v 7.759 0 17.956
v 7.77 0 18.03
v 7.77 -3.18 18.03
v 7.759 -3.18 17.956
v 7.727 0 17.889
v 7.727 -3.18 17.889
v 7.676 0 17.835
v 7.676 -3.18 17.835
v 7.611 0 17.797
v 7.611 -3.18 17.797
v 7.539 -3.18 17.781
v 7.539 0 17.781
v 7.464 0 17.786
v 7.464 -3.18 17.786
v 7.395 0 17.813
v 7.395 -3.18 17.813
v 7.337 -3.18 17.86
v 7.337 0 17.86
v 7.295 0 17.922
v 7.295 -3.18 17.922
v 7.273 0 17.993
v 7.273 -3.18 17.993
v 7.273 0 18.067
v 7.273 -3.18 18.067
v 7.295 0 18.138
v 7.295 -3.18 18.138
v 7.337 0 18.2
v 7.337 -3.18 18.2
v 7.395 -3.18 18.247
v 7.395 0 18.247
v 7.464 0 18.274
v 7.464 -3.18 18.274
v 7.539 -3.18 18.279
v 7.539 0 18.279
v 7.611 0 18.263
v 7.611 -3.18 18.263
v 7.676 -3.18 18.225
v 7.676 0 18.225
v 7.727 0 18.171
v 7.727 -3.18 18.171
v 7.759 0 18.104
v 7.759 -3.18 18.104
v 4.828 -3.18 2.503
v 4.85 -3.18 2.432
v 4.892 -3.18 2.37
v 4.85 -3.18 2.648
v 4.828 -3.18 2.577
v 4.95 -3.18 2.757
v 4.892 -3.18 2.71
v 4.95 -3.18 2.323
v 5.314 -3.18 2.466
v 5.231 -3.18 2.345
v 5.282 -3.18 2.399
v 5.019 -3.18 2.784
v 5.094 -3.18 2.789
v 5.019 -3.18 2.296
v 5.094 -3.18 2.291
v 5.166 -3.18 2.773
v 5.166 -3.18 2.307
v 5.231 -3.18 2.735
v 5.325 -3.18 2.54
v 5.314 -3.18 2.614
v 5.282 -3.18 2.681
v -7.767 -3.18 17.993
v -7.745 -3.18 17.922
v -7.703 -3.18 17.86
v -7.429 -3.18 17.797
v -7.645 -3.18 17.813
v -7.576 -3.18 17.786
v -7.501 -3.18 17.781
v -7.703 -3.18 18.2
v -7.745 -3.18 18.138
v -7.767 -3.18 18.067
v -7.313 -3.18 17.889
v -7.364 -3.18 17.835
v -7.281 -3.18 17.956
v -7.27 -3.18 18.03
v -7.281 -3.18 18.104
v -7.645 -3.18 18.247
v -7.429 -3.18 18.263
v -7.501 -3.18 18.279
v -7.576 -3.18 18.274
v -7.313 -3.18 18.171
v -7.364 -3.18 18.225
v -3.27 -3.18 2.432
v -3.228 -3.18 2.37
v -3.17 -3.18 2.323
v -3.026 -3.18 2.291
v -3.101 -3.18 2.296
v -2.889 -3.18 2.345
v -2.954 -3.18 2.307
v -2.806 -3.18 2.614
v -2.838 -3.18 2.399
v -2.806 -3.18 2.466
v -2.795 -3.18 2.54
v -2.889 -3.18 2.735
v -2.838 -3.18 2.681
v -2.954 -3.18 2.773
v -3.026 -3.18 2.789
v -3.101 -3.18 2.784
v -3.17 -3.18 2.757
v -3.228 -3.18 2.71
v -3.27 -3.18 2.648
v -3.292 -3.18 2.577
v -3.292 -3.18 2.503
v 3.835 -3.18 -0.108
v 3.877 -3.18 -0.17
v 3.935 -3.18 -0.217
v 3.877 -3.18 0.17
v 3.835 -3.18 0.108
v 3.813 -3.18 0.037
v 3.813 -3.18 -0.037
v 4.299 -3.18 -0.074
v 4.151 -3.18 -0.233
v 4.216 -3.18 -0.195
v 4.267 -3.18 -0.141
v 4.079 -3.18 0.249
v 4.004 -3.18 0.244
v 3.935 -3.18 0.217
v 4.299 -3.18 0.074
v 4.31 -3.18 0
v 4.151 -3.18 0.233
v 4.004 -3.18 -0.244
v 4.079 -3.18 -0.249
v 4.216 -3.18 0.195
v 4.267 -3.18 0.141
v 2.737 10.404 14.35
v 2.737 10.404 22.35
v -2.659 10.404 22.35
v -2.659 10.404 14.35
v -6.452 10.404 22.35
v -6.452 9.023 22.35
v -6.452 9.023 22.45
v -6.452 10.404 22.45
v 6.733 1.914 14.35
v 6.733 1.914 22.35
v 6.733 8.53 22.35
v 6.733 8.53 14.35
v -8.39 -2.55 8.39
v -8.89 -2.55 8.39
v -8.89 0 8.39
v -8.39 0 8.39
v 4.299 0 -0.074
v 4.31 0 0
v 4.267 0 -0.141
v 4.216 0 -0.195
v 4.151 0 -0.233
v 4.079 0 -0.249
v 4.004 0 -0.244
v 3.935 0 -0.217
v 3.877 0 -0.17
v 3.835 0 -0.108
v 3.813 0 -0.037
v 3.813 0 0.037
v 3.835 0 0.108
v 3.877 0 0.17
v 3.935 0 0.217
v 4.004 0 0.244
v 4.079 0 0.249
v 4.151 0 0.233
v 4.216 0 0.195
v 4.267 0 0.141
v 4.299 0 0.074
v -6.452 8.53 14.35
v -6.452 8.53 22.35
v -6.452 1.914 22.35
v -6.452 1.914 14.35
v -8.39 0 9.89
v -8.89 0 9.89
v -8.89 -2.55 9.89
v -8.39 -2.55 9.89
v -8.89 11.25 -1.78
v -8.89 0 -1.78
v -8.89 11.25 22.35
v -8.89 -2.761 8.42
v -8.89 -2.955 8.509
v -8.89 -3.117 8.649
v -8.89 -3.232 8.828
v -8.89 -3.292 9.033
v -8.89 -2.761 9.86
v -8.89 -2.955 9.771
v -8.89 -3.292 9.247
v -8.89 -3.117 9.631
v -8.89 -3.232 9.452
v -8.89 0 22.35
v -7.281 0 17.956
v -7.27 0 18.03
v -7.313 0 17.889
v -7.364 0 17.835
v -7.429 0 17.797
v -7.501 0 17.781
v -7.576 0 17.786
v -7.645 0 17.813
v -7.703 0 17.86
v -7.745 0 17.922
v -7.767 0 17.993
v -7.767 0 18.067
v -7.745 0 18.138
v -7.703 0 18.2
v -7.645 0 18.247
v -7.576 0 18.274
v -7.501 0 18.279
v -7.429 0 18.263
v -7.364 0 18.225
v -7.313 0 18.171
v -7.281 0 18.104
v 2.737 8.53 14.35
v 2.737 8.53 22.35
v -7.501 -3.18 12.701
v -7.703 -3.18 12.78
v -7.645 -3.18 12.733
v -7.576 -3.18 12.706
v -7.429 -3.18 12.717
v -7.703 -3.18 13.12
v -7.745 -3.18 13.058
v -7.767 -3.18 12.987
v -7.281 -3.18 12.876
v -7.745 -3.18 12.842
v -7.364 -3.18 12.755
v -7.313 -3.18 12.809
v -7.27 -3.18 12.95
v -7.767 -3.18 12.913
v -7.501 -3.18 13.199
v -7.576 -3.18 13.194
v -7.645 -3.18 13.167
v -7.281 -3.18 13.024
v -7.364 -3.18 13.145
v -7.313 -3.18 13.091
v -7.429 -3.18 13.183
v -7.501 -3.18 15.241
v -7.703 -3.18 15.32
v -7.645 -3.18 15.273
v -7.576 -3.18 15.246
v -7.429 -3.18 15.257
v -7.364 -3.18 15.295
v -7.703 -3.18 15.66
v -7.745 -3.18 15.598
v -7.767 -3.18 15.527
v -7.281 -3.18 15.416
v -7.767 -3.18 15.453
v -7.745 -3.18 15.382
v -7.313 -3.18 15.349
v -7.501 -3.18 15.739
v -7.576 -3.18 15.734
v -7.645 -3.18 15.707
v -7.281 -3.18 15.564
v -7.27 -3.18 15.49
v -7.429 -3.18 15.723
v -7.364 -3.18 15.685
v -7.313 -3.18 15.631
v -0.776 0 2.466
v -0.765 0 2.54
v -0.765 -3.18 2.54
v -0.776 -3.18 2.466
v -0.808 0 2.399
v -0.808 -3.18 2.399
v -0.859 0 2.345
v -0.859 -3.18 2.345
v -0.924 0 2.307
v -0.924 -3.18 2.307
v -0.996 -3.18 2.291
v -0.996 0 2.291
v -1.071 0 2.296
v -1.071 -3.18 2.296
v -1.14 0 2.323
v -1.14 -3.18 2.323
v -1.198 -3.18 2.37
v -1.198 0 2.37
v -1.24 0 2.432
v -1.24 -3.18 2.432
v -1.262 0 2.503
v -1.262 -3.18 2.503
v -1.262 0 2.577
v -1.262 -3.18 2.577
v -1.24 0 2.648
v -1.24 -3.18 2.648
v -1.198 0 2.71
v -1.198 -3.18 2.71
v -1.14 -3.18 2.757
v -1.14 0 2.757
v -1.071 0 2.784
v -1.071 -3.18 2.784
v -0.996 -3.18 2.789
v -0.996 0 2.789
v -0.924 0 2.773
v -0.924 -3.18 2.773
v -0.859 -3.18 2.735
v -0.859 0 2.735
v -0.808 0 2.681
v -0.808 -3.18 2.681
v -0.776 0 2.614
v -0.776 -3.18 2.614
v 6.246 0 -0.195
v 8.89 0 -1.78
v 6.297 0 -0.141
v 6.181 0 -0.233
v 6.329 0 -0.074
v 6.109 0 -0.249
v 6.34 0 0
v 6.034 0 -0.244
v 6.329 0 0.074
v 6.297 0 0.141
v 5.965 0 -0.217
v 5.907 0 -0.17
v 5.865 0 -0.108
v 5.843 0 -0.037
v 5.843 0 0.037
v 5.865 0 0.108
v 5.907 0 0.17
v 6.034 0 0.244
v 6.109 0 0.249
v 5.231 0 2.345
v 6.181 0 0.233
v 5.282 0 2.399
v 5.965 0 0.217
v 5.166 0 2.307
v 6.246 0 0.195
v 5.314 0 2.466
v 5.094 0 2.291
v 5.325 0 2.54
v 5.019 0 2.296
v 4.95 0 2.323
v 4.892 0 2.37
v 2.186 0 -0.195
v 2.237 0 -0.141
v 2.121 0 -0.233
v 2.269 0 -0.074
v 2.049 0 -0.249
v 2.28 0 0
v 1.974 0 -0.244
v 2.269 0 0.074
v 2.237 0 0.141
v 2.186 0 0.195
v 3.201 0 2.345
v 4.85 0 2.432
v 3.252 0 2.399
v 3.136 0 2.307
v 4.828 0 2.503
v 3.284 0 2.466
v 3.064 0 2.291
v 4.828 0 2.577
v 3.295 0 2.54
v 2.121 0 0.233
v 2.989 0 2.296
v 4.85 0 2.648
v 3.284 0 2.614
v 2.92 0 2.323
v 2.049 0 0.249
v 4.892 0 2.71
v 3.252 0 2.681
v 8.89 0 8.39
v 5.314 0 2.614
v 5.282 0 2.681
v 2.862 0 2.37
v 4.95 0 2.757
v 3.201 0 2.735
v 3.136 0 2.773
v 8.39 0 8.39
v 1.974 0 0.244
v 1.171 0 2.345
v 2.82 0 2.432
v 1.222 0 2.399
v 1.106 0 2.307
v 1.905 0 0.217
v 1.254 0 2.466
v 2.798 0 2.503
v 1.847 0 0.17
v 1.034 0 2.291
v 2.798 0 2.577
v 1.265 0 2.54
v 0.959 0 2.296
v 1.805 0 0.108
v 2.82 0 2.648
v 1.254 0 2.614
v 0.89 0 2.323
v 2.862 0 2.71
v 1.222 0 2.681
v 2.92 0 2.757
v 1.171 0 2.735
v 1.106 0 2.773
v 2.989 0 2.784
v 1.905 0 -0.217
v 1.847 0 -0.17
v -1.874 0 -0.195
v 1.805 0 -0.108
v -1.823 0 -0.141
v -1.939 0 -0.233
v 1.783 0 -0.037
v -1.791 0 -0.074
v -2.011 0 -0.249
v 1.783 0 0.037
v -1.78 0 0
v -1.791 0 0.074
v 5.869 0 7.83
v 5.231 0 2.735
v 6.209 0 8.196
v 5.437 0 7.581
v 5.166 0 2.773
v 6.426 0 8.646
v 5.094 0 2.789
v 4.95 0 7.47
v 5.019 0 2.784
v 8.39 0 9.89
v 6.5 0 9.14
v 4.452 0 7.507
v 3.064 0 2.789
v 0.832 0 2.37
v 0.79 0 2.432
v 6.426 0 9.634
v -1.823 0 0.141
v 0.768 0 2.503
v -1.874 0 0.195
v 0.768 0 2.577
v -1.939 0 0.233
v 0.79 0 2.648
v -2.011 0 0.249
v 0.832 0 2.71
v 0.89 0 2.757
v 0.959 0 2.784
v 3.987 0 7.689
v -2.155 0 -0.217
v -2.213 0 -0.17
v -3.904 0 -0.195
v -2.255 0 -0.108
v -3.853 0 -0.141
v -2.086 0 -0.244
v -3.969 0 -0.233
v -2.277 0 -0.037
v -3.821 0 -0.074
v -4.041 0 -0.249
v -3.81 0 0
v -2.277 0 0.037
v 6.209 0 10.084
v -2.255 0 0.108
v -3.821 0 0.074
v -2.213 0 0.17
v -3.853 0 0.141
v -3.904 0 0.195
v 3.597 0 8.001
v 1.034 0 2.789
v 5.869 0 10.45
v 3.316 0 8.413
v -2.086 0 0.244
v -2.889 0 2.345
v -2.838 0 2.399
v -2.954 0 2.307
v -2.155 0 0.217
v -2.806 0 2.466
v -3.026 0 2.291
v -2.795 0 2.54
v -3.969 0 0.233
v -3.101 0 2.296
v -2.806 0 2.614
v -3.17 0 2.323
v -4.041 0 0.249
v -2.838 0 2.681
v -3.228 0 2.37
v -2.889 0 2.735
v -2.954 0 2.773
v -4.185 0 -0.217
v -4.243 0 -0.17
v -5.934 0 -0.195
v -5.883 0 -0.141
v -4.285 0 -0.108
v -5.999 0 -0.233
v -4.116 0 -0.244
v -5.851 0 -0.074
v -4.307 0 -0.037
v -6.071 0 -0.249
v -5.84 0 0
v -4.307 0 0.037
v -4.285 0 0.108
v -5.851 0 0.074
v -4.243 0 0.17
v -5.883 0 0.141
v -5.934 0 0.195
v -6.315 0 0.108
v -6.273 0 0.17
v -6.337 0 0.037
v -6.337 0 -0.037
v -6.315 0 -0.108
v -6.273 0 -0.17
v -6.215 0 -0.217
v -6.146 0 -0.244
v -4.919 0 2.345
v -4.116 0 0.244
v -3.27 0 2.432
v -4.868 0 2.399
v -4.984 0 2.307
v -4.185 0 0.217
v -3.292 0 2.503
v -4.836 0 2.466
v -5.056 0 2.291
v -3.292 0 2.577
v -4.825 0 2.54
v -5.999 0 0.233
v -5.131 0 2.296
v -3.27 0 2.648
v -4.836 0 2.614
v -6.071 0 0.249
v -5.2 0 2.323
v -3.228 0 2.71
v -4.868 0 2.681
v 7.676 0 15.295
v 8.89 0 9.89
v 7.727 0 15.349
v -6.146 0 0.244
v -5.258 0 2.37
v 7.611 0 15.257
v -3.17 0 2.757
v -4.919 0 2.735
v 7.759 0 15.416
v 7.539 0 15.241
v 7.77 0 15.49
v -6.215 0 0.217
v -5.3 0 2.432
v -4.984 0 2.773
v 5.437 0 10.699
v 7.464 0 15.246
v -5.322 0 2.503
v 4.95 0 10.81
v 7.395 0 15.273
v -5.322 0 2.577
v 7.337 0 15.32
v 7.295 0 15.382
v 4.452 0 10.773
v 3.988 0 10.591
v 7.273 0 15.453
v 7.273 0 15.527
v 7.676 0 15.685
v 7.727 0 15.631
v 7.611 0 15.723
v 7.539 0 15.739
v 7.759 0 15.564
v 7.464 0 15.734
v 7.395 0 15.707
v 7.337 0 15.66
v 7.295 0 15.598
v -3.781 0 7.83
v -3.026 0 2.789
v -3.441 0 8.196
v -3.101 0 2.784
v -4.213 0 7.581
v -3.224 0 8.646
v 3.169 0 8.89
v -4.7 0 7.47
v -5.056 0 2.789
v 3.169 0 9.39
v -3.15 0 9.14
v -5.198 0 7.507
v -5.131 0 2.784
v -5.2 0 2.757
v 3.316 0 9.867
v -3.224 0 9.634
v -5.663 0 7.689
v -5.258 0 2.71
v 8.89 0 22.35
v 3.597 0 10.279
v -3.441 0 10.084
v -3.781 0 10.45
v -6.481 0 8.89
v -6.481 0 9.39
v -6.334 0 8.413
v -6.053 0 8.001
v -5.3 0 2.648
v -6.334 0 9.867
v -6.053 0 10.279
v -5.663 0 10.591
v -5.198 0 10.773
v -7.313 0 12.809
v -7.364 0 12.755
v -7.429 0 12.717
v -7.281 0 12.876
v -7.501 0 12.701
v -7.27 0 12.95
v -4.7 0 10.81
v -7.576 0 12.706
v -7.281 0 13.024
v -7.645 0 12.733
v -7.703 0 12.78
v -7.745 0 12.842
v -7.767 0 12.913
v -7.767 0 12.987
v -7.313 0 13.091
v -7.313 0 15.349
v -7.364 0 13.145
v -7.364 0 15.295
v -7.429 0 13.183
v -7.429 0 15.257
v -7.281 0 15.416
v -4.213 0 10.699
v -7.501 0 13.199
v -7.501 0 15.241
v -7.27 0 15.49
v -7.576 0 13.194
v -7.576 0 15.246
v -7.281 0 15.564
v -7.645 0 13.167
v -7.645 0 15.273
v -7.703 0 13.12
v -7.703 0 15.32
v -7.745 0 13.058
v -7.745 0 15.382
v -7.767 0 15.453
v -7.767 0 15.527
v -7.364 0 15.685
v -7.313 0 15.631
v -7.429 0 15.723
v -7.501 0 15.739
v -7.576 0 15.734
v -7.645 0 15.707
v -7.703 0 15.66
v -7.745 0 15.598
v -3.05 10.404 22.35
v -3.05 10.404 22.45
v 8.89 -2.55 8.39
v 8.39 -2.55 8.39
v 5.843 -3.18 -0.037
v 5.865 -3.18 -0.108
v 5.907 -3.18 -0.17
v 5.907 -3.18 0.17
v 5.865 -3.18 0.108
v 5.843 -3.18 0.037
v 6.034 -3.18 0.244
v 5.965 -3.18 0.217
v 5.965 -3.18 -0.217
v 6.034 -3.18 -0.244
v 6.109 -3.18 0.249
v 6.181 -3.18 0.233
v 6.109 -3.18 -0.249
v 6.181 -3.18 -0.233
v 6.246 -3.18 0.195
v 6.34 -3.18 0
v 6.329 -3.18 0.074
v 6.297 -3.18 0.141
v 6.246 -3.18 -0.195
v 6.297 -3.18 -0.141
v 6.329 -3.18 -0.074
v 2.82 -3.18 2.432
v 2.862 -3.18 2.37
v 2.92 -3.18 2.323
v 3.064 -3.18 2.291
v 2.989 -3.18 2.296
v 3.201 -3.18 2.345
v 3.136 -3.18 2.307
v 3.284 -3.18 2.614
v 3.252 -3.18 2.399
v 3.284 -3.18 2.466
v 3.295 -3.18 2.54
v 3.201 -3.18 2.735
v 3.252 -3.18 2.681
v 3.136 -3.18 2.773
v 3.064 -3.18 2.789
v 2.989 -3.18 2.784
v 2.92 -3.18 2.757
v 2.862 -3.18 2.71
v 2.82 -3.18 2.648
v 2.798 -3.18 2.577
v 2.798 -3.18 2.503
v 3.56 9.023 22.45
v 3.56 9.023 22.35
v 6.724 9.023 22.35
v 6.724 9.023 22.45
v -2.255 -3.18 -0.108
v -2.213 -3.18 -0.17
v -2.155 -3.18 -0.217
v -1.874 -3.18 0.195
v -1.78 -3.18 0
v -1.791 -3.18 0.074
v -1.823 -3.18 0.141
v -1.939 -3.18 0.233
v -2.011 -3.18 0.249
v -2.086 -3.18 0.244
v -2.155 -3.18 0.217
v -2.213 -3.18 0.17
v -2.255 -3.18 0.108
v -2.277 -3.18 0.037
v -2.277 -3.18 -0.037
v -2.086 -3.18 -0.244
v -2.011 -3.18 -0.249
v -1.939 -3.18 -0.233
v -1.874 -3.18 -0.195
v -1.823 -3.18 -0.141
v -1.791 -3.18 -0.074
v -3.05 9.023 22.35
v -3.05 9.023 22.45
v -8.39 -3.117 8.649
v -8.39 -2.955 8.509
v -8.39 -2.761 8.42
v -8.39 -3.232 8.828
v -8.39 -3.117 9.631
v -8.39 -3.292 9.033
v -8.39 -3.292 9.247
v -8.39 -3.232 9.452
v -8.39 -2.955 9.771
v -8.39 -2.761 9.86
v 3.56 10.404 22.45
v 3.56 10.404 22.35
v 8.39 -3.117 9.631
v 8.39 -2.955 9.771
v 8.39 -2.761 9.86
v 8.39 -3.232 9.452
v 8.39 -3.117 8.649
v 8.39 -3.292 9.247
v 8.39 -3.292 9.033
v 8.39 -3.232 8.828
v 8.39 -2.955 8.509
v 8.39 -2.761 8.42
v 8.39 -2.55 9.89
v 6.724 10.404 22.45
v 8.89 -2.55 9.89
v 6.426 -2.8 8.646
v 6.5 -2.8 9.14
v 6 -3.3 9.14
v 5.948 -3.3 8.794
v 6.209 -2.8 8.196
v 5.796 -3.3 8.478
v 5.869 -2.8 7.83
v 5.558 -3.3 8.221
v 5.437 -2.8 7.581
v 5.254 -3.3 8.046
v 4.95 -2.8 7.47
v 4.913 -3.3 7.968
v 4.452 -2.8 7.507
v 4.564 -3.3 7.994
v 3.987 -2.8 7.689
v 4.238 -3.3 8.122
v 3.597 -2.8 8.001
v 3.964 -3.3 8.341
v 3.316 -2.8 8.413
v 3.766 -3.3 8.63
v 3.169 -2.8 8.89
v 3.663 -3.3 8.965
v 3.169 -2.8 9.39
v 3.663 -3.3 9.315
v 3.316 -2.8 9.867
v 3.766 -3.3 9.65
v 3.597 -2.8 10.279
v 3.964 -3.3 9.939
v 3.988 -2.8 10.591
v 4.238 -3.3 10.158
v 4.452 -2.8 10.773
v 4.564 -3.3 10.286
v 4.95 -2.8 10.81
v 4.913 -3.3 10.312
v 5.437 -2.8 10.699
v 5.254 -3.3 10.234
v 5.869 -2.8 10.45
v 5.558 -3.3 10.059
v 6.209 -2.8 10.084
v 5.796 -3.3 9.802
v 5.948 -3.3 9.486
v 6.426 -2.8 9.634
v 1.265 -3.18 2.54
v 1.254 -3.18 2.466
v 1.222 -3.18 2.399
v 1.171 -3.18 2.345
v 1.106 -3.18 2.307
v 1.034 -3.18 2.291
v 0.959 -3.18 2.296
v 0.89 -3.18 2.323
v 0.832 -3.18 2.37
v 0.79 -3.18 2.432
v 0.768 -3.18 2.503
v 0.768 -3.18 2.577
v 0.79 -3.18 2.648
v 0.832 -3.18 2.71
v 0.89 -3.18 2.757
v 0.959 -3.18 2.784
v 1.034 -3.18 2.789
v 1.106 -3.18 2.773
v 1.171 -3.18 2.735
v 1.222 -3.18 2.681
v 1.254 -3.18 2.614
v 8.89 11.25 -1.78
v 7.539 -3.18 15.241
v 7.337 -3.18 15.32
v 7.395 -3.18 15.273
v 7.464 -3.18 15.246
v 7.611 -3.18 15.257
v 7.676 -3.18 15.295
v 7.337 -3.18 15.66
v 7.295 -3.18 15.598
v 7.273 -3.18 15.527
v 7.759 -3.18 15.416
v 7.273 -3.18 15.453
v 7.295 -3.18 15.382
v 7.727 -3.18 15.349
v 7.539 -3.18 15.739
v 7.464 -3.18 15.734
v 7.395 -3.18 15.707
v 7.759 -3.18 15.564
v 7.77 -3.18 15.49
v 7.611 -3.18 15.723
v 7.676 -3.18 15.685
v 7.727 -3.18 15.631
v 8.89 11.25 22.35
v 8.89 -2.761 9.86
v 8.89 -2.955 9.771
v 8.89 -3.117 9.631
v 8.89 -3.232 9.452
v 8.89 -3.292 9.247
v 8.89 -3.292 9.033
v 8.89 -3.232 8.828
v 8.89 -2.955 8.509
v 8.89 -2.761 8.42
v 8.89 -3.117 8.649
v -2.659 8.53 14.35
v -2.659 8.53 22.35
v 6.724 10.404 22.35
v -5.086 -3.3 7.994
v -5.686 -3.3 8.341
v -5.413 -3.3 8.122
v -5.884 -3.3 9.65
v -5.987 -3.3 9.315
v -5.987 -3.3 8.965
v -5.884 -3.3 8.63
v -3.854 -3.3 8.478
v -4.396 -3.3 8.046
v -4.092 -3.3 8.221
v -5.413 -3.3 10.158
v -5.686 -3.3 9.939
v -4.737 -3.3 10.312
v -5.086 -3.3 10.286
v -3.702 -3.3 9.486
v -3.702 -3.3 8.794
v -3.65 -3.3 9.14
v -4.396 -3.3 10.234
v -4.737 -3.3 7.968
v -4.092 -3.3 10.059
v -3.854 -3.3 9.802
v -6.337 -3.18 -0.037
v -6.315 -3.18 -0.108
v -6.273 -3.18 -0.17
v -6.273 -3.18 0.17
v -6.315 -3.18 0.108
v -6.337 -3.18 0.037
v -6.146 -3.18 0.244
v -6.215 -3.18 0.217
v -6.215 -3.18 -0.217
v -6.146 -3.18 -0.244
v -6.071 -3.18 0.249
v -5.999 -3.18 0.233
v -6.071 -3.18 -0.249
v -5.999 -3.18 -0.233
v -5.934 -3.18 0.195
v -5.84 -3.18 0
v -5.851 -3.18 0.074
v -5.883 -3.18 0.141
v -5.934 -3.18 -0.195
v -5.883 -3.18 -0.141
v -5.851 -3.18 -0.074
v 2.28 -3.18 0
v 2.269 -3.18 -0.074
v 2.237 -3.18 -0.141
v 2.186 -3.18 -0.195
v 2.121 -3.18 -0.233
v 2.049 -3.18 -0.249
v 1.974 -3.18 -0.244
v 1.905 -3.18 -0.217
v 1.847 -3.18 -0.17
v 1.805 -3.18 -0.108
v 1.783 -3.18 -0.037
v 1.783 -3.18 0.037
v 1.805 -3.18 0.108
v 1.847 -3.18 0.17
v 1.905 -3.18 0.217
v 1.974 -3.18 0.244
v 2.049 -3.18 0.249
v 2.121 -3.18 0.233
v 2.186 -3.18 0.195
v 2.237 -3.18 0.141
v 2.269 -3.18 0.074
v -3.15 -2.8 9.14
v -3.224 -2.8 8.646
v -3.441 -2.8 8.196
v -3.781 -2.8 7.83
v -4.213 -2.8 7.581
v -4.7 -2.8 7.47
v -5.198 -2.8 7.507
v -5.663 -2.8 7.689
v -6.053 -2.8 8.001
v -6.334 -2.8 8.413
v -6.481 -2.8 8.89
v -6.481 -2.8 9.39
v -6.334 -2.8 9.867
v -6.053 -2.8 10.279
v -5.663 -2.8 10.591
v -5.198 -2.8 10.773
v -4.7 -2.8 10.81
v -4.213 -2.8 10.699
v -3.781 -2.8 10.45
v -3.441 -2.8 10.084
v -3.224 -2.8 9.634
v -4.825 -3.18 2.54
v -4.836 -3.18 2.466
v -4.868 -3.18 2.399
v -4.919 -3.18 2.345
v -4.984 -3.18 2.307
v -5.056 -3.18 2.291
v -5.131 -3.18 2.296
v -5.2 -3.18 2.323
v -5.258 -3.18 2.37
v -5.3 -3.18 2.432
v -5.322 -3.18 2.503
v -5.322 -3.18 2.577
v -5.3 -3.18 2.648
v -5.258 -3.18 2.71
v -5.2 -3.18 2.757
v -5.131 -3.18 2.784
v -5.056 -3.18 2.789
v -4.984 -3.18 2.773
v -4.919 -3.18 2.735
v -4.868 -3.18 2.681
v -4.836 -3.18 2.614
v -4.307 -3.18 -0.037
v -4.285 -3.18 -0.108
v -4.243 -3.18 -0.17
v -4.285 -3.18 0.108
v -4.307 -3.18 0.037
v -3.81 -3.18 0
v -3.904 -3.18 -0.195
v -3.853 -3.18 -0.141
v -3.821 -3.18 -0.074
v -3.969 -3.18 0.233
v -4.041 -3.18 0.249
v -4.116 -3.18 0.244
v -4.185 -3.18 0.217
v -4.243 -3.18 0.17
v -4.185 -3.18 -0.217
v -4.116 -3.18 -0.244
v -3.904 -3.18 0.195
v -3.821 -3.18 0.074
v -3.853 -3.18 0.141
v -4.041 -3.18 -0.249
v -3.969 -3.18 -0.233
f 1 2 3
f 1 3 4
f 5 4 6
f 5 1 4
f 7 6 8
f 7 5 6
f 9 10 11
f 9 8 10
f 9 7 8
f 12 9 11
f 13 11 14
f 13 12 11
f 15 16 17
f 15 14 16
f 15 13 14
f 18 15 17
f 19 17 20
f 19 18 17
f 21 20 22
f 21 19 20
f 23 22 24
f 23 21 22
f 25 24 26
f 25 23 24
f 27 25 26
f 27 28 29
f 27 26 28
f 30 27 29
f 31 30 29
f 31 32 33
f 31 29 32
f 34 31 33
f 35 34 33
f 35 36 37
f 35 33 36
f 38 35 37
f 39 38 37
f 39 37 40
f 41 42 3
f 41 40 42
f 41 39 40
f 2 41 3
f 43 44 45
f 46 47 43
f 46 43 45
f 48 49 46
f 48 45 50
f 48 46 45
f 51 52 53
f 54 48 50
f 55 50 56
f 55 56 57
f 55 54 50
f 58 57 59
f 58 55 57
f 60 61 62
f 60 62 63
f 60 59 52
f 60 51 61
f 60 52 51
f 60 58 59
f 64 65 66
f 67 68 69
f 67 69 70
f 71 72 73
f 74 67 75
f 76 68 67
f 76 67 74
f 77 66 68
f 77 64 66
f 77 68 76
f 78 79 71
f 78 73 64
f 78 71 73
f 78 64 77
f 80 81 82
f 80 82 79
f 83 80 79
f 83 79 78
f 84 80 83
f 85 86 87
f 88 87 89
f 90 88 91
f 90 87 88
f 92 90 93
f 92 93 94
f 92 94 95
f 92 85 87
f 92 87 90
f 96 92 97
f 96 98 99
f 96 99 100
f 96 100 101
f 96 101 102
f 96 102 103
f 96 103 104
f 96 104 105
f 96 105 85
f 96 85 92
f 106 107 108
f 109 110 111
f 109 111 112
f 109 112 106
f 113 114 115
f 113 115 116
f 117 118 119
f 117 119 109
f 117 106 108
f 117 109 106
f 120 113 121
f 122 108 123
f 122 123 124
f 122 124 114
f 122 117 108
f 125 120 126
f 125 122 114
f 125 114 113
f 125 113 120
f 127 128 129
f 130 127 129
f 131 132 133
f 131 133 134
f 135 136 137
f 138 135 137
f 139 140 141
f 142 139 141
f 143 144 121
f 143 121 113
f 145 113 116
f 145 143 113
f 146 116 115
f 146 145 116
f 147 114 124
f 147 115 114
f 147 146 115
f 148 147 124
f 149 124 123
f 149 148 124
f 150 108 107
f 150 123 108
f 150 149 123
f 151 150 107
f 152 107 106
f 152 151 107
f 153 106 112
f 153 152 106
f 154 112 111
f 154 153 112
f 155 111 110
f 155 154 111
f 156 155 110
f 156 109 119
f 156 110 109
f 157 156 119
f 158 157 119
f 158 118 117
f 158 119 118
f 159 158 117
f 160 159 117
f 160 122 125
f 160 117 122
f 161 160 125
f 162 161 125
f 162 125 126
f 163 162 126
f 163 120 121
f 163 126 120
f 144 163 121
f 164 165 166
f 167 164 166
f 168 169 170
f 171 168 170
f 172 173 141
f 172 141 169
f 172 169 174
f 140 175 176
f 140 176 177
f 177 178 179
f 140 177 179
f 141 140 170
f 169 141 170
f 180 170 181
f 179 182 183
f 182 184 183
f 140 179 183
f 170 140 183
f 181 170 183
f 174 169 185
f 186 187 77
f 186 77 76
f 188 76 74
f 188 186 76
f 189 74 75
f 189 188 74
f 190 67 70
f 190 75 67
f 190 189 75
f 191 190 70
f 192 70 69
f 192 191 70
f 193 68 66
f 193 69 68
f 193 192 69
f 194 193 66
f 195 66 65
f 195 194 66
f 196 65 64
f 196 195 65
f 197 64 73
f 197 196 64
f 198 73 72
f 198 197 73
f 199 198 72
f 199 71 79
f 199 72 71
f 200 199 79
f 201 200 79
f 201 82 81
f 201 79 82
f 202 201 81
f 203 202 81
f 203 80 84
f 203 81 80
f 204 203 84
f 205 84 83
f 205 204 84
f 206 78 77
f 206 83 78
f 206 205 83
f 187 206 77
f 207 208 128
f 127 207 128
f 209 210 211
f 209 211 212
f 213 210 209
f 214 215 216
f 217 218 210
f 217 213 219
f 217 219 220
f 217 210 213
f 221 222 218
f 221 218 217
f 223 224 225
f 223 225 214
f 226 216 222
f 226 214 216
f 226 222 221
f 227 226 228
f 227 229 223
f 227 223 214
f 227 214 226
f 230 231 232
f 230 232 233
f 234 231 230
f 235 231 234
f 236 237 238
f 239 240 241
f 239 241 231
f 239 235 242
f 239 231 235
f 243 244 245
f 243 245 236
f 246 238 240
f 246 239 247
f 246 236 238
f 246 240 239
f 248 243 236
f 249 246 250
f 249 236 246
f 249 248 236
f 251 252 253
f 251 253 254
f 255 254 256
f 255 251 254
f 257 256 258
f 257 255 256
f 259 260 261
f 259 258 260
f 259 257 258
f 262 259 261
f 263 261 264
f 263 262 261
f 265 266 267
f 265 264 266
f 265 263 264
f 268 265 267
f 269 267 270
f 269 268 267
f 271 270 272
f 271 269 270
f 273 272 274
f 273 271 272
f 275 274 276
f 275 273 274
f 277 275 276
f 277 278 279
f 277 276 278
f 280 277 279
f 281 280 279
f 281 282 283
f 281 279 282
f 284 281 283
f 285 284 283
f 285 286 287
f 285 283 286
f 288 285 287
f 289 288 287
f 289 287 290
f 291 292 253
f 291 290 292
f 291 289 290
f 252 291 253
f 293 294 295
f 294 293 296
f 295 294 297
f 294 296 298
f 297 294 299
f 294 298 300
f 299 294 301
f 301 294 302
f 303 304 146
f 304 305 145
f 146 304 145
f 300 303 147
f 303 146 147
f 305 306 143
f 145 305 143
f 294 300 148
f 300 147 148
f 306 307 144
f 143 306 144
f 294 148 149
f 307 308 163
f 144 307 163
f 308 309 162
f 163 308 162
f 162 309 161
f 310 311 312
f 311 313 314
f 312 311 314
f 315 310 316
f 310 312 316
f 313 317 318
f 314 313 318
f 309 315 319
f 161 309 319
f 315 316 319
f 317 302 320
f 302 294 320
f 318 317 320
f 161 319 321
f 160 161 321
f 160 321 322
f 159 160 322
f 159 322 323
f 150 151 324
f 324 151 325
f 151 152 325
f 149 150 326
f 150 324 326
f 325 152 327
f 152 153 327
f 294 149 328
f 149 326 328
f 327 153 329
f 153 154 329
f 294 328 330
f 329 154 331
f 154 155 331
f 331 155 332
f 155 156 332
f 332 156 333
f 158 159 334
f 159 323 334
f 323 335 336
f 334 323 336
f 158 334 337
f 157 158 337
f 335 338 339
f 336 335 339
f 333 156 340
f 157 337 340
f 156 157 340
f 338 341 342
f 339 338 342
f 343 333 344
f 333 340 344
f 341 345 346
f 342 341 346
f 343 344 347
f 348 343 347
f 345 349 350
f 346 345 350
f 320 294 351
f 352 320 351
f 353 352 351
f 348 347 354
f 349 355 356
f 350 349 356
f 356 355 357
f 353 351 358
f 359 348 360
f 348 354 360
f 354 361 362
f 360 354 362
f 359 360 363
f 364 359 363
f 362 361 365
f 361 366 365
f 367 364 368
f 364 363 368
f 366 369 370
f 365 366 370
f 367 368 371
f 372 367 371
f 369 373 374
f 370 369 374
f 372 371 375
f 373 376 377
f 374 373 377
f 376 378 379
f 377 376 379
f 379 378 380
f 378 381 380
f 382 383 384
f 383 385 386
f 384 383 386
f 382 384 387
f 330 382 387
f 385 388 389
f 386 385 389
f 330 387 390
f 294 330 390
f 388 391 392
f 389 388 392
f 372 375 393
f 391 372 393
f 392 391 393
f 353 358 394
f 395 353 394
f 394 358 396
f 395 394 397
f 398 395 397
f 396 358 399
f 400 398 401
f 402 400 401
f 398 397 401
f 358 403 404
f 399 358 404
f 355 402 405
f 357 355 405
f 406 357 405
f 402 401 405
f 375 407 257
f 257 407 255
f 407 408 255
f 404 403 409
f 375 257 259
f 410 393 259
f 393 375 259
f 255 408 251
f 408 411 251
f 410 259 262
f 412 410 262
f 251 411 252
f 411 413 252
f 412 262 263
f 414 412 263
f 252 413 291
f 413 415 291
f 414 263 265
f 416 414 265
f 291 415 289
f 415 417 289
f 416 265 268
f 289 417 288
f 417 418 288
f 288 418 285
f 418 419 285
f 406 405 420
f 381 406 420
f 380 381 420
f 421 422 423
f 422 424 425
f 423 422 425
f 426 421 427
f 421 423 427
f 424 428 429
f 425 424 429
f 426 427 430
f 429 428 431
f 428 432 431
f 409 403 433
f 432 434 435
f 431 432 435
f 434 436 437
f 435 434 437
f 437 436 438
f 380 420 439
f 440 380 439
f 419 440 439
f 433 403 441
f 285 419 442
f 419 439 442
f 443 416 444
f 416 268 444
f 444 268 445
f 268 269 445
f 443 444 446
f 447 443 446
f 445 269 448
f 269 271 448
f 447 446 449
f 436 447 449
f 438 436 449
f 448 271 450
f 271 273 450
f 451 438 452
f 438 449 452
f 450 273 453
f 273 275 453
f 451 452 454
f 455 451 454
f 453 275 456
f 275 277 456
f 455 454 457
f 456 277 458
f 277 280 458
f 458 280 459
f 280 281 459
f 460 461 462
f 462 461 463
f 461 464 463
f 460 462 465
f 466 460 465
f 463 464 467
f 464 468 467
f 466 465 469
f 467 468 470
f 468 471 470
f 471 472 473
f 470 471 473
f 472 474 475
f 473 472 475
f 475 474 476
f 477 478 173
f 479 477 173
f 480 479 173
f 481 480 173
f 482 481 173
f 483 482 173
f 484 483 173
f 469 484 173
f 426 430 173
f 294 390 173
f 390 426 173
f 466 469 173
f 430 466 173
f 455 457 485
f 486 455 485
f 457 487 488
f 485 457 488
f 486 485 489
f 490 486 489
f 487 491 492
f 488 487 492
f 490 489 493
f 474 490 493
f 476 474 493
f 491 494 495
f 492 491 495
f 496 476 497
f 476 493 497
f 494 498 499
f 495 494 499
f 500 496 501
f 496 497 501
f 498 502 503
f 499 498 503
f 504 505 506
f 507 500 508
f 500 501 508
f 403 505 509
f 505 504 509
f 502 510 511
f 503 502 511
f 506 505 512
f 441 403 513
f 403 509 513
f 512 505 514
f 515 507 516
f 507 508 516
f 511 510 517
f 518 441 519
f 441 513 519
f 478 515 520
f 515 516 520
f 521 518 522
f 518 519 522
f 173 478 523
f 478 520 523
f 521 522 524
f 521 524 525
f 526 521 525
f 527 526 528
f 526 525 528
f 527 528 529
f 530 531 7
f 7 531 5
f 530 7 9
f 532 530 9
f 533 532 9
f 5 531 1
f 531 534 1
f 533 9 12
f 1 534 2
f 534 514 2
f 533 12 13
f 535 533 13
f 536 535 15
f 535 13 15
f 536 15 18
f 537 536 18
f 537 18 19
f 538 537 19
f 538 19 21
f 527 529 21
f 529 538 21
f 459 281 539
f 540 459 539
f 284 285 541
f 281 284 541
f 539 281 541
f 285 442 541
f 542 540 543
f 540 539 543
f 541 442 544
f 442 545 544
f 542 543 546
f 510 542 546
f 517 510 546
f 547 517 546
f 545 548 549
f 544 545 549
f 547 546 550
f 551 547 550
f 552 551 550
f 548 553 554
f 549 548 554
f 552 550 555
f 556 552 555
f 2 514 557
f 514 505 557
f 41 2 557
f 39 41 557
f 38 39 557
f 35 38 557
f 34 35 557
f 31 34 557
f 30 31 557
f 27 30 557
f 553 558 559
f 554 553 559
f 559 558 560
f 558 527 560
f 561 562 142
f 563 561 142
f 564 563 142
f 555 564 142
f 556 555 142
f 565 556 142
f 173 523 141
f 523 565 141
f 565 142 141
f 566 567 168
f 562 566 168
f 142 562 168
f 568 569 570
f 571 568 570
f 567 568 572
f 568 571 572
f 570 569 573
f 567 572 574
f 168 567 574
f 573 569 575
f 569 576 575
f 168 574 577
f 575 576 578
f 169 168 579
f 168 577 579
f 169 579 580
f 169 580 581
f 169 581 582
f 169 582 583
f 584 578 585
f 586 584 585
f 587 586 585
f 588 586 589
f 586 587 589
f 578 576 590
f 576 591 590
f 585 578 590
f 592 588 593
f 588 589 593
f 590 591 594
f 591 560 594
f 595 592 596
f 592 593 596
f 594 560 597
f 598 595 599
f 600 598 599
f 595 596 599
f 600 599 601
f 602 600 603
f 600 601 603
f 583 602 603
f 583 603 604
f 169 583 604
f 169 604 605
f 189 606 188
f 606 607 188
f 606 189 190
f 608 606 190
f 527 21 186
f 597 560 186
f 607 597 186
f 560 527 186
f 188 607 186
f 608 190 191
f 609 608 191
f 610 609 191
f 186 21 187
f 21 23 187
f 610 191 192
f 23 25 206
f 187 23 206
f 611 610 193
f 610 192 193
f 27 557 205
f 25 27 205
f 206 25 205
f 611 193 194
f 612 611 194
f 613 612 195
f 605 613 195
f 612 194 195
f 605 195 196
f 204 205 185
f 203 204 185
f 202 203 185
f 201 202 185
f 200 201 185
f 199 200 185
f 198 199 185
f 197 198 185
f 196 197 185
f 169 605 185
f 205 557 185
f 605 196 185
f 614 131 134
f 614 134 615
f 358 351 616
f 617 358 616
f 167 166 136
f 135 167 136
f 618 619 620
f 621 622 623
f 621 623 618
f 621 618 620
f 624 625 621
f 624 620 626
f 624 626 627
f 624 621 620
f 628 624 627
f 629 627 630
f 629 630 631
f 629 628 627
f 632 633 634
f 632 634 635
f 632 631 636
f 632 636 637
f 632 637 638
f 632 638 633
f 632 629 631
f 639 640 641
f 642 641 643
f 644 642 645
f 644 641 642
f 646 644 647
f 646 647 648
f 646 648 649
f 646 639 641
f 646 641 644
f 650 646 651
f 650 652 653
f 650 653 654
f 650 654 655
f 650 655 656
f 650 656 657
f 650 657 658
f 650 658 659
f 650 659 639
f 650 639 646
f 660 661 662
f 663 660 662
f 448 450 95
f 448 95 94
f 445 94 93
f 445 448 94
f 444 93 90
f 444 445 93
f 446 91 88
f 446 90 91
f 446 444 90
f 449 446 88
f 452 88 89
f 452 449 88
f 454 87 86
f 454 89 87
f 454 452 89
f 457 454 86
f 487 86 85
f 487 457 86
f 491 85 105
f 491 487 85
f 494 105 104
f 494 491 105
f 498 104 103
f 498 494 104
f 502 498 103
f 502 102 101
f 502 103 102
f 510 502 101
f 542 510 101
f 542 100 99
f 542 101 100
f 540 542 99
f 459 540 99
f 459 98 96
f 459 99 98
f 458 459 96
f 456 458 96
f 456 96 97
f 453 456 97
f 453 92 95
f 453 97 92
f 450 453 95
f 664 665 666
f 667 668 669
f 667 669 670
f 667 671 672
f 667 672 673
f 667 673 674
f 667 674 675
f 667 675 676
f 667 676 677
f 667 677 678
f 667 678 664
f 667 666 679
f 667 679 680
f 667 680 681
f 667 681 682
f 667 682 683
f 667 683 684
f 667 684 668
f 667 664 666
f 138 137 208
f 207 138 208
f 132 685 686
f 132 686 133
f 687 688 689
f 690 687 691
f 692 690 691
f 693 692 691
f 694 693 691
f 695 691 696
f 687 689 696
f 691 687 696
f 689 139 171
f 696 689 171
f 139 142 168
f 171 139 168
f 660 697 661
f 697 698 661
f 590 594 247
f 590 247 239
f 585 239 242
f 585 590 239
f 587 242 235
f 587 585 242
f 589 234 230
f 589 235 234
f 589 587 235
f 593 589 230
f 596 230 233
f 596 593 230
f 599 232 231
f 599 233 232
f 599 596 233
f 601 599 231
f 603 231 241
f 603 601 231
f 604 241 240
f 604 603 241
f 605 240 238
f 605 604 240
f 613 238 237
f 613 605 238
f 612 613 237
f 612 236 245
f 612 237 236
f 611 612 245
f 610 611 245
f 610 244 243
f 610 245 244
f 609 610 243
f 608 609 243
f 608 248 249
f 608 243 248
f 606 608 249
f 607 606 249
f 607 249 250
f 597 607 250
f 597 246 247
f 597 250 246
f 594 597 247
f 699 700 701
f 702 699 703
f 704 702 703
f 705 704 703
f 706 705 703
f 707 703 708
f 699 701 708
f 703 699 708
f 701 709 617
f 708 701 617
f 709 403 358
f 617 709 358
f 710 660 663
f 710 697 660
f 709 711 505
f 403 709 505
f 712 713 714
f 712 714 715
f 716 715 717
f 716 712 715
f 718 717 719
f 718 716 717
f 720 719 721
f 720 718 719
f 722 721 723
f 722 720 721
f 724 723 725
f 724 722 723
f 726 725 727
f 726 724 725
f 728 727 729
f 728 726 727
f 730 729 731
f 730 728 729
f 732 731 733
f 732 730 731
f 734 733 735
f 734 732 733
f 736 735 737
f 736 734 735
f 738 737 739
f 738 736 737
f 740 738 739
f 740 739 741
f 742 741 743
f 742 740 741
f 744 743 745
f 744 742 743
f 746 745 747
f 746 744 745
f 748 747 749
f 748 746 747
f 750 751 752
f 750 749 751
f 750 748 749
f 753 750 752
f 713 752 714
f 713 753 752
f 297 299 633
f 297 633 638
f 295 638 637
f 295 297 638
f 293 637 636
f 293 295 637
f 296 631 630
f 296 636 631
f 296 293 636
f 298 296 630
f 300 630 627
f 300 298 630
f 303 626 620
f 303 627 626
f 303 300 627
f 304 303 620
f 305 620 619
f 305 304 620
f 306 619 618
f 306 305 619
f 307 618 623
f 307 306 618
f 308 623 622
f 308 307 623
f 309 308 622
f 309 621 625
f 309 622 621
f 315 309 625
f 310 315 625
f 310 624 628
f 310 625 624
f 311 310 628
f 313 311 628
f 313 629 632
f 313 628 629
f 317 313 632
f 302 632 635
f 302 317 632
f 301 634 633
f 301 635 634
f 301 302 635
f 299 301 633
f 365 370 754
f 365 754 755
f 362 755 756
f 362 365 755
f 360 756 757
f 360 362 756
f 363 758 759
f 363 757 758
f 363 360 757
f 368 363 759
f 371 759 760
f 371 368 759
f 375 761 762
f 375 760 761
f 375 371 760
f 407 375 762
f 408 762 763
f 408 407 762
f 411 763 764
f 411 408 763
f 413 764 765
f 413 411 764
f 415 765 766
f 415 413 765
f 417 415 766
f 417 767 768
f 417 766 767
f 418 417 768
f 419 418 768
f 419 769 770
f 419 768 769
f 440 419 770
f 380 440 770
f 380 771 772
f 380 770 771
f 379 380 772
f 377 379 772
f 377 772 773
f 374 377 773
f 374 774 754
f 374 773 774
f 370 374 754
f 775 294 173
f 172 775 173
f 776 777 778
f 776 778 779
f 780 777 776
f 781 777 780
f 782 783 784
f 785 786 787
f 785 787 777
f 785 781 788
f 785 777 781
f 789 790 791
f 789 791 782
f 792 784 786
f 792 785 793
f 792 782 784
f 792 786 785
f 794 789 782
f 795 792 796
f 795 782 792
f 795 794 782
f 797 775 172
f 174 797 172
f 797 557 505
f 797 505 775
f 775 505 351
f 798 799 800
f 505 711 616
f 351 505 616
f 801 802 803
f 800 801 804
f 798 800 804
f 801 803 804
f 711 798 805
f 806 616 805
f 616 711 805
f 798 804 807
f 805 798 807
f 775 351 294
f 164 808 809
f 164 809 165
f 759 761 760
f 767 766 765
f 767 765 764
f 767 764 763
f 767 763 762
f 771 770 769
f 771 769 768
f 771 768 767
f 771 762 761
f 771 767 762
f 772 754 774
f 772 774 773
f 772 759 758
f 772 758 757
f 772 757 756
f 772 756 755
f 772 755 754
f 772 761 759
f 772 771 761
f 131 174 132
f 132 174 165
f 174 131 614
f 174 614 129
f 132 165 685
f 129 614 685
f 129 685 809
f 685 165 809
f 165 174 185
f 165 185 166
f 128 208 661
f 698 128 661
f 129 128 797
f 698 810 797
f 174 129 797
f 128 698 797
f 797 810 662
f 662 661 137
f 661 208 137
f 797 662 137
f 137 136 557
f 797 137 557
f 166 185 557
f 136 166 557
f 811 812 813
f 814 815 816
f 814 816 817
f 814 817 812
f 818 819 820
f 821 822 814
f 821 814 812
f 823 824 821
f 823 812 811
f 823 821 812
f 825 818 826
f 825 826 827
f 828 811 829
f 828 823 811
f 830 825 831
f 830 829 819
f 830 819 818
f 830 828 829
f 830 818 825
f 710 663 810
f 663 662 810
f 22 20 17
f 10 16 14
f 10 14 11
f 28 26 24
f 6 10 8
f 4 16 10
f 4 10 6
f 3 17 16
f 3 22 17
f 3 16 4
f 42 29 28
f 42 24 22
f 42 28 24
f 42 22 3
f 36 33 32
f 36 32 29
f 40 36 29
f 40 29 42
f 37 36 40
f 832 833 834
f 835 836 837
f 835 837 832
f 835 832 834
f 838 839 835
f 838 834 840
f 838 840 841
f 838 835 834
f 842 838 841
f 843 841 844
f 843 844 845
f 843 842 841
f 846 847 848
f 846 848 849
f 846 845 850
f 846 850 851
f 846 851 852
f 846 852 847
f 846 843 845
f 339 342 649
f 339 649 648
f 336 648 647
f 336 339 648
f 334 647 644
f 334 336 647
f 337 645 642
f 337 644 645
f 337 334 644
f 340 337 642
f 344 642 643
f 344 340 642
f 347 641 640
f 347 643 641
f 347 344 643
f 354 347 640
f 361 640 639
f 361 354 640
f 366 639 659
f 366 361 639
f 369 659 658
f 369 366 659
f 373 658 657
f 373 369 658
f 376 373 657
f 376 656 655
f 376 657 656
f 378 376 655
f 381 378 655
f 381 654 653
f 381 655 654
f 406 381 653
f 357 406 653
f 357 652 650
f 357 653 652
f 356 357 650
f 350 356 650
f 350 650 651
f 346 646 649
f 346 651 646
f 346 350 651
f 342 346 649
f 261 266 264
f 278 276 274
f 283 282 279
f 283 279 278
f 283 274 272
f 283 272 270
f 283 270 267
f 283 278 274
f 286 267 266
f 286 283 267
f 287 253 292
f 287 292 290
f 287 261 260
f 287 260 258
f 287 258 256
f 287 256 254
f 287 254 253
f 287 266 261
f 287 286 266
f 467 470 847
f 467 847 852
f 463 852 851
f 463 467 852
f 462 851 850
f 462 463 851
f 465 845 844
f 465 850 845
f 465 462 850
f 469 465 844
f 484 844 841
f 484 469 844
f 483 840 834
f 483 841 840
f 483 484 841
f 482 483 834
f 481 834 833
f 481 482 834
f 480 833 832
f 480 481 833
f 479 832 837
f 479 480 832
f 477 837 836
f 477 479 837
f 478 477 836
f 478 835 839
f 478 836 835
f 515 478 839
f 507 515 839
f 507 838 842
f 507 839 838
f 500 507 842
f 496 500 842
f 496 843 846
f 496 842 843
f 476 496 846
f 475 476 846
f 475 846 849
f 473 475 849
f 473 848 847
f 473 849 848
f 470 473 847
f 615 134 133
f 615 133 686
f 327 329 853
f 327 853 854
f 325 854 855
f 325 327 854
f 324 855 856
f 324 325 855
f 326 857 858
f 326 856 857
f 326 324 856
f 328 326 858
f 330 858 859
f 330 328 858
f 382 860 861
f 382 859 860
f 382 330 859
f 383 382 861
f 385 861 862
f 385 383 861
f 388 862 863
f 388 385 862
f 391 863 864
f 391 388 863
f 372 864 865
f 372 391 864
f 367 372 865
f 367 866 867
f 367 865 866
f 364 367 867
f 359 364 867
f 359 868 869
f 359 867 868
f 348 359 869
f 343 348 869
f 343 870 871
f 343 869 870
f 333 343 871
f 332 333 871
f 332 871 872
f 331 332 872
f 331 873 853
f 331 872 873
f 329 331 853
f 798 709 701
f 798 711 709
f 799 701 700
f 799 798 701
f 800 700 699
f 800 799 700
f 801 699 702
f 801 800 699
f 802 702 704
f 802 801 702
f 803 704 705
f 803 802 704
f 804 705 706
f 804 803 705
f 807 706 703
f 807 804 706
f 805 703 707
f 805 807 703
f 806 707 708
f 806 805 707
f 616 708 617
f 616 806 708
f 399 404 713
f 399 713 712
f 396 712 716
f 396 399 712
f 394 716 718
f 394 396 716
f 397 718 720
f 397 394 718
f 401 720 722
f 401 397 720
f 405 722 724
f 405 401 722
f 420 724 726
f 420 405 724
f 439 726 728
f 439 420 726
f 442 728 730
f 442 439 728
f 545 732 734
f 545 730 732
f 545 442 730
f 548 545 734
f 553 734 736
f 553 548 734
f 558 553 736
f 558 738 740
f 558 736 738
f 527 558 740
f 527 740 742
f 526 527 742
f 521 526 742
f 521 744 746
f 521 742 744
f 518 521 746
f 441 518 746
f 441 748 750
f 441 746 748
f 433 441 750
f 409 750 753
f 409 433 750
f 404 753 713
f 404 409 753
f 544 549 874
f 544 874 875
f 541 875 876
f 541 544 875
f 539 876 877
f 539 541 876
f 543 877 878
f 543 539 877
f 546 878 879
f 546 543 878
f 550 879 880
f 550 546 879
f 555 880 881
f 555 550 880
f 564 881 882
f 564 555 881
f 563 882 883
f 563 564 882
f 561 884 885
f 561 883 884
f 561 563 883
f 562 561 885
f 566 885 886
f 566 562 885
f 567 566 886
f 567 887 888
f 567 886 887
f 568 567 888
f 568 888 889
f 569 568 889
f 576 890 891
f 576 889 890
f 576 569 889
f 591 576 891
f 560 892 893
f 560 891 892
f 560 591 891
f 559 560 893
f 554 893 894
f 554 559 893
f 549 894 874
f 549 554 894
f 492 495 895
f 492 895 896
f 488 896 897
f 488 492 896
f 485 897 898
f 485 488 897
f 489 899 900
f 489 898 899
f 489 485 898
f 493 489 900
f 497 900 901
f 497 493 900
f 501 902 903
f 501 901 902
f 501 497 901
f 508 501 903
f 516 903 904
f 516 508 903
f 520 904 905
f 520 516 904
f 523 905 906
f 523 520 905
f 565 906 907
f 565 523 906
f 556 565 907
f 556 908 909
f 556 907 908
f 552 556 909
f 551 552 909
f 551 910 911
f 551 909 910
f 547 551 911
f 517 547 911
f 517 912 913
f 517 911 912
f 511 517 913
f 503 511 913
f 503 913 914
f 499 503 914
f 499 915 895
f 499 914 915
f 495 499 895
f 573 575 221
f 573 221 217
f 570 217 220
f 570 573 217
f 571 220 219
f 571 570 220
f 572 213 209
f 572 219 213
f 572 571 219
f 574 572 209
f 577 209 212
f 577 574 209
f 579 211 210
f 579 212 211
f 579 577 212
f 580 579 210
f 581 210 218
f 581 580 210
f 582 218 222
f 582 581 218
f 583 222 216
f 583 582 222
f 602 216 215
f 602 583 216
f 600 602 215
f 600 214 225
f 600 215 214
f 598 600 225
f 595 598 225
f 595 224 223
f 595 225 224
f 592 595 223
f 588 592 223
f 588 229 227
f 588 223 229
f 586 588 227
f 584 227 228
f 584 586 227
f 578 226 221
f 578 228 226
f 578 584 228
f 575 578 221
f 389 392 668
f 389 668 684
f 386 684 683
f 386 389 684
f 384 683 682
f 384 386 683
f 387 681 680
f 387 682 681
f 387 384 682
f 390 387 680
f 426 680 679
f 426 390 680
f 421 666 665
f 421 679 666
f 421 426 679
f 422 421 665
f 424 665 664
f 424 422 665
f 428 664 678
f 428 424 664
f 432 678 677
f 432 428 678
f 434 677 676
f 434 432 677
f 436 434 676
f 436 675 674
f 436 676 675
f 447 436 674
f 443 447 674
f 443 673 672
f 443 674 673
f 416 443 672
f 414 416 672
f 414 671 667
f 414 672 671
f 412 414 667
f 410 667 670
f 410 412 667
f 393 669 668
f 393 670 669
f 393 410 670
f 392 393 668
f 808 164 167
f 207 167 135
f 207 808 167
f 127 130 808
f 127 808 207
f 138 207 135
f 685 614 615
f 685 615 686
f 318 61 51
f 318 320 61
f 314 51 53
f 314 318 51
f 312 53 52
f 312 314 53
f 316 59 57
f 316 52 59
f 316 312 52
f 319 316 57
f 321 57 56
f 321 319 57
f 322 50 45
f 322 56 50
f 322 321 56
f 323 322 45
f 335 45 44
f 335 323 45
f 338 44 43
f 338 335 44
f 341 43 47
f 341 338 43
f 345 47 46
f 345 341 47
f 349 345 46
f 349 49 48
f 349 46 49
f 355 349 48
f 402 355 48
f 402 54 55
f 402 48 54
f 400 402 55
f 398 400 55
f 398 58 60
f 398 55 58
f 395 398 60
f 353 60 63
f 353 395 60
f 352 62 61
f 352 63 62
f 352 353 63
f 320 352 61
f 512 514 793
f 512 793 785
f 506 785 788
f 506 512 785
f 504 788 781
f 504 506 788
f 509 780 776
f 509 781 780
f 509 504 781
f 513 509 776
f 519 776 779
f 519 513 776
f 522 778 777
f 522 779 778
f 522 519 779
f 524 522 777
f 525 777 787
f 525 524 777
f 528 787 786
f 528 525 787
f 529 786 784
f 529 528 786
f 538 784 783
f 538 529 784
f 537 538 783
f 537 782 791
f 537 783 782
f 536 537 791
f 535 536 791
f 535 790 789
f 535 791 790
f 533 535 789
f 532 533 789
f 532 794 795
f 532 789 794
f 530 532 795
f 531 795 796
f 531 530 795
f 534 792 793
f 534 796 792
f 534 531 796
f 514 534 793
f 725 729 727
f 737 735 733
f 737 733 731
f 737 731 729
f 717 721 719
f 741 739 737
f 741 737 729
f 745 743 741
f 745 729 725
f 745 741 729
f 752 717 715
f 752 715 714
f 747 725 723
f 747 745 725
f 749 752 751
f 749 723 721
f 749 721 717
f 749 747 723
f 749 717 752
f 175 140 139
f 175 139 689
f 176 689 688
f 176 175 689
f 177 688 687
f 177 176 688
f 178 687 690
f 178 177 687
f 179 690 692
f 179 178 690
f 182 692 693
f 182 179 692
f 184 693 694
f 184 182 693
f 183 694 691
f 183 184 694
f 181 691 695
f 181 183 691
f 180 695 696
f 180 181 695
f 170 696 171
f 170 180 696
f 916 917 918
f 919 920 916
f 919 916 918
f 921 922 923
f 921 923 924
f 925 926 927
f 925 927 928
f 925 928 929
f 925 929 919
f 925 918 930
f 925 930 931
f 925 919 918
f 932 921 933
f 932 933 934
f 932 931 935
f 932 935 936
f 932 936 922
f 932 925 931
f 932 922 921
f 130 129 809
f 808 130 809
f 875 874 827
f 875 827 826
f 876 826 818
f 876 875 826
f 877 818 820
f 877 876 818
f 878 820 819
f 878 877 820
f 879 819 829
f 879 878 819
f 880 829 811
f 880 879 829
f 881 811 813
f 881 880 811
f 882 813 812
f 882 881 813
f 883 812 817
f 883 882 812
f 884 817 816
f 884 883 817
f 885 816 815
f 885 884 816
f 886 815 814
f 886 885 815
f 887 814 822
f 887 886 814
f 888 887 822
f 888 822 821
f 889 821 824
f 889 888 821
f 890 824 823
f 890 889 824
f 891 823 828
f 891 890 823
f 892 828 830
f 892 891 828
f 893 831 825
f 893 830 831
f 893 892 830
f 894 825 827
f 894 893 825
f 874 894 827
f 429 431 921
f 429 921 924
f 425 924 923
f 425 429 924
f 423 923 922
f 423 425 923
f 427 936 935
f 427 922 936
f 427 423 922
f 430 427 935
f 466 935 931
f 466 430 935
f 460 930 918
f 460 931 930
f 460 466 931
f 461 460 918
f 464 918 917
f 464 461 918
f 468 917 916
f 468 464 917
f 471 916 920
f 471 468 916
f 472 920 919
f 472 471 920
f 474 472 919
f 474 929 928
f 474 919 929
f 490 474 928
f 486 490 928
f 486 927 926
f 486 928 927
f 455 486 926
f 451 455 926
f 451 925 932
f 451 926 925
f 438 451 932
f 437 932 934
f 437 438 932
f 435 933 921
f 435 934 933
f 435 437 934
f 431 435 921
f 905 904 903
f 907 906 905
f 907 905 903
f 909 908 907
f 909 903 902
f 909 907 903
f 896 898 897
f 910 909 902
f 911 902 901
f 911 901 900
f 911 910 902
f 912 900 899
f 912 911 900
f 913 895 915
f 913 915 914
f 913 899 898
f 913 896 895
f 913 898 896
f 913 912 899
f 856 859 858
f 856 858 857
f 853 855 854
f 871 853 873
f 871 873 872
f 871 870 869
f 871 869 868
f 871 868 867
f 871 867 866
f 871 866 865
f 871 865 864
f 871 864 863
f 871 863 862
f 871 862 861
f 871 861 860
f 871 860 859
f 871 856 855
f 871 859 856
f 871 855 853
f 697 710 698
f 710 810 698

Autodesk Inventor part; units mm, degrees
ref_plane "YZ Plane" through (0, 0, 0) normal (1, 0, 0) x (0, 1, 0)
ref_plane "XZ Plane" through (0, 0, 0) normal (0, 1, 0) x (-1, 0, 0)
ref_plane "XY Plane" through (0, 0, 0) normal (0, 0, 1) x (1, 0, 0)
sketch "Sketch1" plane through (0, 0, 0) normal (0, 1, 0) x (-1, 0, 0)
  line L0 (8.89, 22.35) -> (-8.89, 22.35)
  line L1 (-8.89, 22.35) -> (-8.89, -1.78)
  line L2 (-8.89, -1.78) -> (8.89, -1.78)
  line L3 (8.89, -1.78) -> (8.89, 22.35)
  point P0 (0, 0)
  dimension "d0" = 24.13
  dimension "d1" = 22.35
  dimension "d2" = 17.78
  dimension "d3" = 8.89
extrude "Extrusion1" add sketch "Sketch1" along normal blind 11.25
sketch "Sketch2" plane through (-8.89, 0, 22.35) normal (0, 0, 1) x (1, 0, 0)
  line L0 (2.4376, 1.9143) -> (15.6231, 1.9143)
  line L1 (15.6231, 1.9143) -> (15.6231, 8.5296)
  line L2 (15.6231, 8.5296) -> (2.4376, 8.5296)
  line L3 (2.4376, 8.5296) -> (2.4376, 1.9143)
  line L4 (6.2307, 8.5296) -> (11.6268, 8.5296)
  line L5 (11.6268, 8.5296) -> (11.6268, 10.4036)
  line L6 (11.6268, 10.4036) -> (6.2307, 10.4036)
  line L7 (6.2307, 10.4036) -> (6.2307, 8.5296)
  point P0 (8.89, 0)
extrude "Extrusion2" cut sketch "Sketch2" against normal blind 8
sketch "Sketch3" plane through (-8.89, 0, 22.35) normal (0, 0, 1) x (1, 0, 0)
  line L0 (12.4503, 9.0228) -> (15.6135, 9.0228)
  line L1 (15.6135, 9.0228) -> (15.6135, 10.4036)
  line L2 (15.6135, 10.4036) -> (12.4503, 10.4036)
  line L3 (12.4503, 10.4036) -> (12.4503, 9.0228)
  line L4 (5.8403, 9.0228) -> (2.4376, 9.0228)
  line L5 (2.4376, 9.0228) -> (2.4376, 10.4036)
  line L6 (2.4376, 10.4036) -> (5.8403, 10.4036)
  line L7 (5.8403, 10.4036) -> (5.8403, 9.0228)
  point P0 (8.89, 0)
extrude "Extrusion3" add sketch "Sketch3" along normal blind 0.1
sketch "Sketch4" plane through (8.89, 0, 22.35) normal (1, 0, 0) x (0, 0, -1)
  line L0 (12.46, 3.4608) -> (13.96, 3.4608)
  line L1 (13.96, 3.4608) -> (13.96, -3.3)
  line L2 (13.96, -3.3) -> (12.46, -3.3)
  line L3 (12.46, -3.3) -> (12.46, 3.4608)
  line L4 (0, 0) -> (0, 11.25) projected
  arc A0 (12.46, -2.55) -> (13.96, -2.55) centre (13.21, -2.55) ccw
  point P0 (22.35, 0)
  dimension "d10" = 1.5
  dimension "d11" = 12.46
  dimension "d12" = 3.3
extrude "Extrusion4" add sketch "Sketch4" against normal blind 0.5 contours L0 L1 A0 L3
mirror "Mirror1" about plane through (0, 0, 0) normal (1, 0, 0) of "Extrusion4"
sketch "Sketch5" plane through (0, 0, 0) normal (0, -1, 0) x (1, 0, 0)
  circle A0 centre (-4.825, 9.14) radius 1.675
  circle A1 centre (4.825, 9.14) radius 1.675
  line L0 (-8.89, 22.35) -> (8.89, 22.35) projected
  point P0 (0, 0)
  dimension "d15" = 9.65
  dimension "d16" = 4.825
  dimension "d17" = 13.21
  dimension "d18" = 13.21
  dimension "d19" = 3.35
  dimension "d20" = 3.35
extrude "Extrusion5" add sketch "Sketch5" along normal blind 3.3
chamfer "Chamfer1" distance 0.5 angle 45 2 edges at (-6.5, -3.3, 9.14) (3.15, -3.3, 9.14)
sketch "Sketch6" plane through (0, 0, 0) normal (0, -1, 0) x (1, 0, 0)
  line L0 (-9.0913, 0) -> (4.8455, 0) construction
  line L1 (4.957, 2.54) -> (-8.5338, 2.54) construction
  circle A0 centre (-2.03, 0) radius 0.25
  circle A1 centre (-1.015, 2.54) radius 0.25
  line L2 (-11.1213, 0) -> (2.8155, 0) construction
  circle A2 centre (-3.045, 2.54) radius 0.25
  line L3 (-13.1513, 0) -> (0.7855, 0) construction
  circle A3 centre (-5.075, 2.54) radius 0.25
  circle A4 centre (1.015, 2.54) radius 0.25
  circle A5 centre (3.045, 2.54) radius 0.25
  circle A6 centre (5.075, 2.54) radius 0.25
  circle A7 centre (-4.06, 0) radius 0.25
  circle A8 centre (-6.09, 0) radius 0.25
  line L4 (0, 0) -> (0, 4.0434) construction
  circle A9 centre (2.03, 0) radius 0.25
  circle A10 centre (4.06, 0) radius 0.25
  circle A11 centre (6.09, 0) radius 0.25
  point P0 (-4.06, 0)
  point P1 (-6.09, 0)
  dimension "d26" = 0.5
  dimension "d27" = 0.5
  dimension "d28" = 2.54
  dimension "d29" = 1.015
  dimension "d30" = 1.015
  dimension "d33" = 2.03
  dimension "d40" = 2.03
  dimension "d47" = 2.03
extrude "Extrusion6" add sketch "Sketch6" along normal blind 3.18
sketch "Sketch7" plane through (0, 0, 0) normal (0, -1, 0) x (1, 0, 0)
  line L0 (7.52, 20.8101) -> (7.52, 18.5144) construction
  line L1 (-7.52, 21.4502) -> (-7.52, 19.3214) construction
  line L2 (-8.1276, 18.03) -> (7.9812, 18.03) construction
  line L3 (-8.0282, 15.49) -> (8.0806, 15.49) construction
  circle A0 centre (-7.52, 18.03) radius 0.25
  circle A1 centre (-7.52, 15.49) radius 0.25
  circle A2 centre (7.52, 18.03) radius 0.25
  circle A3 centre (7.52, 15.49) radius 0.25
  circle A4 centre (-7.52, 12.95) radius 0.25
  point P0 (0, 0)
  dimension "d54" = 7.52
  dimension "d55" = 15.04
  dimension "d56" = 0.5
  dimension "d57" = 0.5
  dimension "d59" = 0.5
  dimension "d60" = 0.5
  dimension "d61" = 18.03
  dimension "d63" = 2.54
  dimension "d66" = 0.5
  dimension "d67" = 2.54
extrude "Extrusion7" add sketch "Sketch7" along normal blind 3.18
properties part number "RJMG2012119A0NR_GBEConn"
